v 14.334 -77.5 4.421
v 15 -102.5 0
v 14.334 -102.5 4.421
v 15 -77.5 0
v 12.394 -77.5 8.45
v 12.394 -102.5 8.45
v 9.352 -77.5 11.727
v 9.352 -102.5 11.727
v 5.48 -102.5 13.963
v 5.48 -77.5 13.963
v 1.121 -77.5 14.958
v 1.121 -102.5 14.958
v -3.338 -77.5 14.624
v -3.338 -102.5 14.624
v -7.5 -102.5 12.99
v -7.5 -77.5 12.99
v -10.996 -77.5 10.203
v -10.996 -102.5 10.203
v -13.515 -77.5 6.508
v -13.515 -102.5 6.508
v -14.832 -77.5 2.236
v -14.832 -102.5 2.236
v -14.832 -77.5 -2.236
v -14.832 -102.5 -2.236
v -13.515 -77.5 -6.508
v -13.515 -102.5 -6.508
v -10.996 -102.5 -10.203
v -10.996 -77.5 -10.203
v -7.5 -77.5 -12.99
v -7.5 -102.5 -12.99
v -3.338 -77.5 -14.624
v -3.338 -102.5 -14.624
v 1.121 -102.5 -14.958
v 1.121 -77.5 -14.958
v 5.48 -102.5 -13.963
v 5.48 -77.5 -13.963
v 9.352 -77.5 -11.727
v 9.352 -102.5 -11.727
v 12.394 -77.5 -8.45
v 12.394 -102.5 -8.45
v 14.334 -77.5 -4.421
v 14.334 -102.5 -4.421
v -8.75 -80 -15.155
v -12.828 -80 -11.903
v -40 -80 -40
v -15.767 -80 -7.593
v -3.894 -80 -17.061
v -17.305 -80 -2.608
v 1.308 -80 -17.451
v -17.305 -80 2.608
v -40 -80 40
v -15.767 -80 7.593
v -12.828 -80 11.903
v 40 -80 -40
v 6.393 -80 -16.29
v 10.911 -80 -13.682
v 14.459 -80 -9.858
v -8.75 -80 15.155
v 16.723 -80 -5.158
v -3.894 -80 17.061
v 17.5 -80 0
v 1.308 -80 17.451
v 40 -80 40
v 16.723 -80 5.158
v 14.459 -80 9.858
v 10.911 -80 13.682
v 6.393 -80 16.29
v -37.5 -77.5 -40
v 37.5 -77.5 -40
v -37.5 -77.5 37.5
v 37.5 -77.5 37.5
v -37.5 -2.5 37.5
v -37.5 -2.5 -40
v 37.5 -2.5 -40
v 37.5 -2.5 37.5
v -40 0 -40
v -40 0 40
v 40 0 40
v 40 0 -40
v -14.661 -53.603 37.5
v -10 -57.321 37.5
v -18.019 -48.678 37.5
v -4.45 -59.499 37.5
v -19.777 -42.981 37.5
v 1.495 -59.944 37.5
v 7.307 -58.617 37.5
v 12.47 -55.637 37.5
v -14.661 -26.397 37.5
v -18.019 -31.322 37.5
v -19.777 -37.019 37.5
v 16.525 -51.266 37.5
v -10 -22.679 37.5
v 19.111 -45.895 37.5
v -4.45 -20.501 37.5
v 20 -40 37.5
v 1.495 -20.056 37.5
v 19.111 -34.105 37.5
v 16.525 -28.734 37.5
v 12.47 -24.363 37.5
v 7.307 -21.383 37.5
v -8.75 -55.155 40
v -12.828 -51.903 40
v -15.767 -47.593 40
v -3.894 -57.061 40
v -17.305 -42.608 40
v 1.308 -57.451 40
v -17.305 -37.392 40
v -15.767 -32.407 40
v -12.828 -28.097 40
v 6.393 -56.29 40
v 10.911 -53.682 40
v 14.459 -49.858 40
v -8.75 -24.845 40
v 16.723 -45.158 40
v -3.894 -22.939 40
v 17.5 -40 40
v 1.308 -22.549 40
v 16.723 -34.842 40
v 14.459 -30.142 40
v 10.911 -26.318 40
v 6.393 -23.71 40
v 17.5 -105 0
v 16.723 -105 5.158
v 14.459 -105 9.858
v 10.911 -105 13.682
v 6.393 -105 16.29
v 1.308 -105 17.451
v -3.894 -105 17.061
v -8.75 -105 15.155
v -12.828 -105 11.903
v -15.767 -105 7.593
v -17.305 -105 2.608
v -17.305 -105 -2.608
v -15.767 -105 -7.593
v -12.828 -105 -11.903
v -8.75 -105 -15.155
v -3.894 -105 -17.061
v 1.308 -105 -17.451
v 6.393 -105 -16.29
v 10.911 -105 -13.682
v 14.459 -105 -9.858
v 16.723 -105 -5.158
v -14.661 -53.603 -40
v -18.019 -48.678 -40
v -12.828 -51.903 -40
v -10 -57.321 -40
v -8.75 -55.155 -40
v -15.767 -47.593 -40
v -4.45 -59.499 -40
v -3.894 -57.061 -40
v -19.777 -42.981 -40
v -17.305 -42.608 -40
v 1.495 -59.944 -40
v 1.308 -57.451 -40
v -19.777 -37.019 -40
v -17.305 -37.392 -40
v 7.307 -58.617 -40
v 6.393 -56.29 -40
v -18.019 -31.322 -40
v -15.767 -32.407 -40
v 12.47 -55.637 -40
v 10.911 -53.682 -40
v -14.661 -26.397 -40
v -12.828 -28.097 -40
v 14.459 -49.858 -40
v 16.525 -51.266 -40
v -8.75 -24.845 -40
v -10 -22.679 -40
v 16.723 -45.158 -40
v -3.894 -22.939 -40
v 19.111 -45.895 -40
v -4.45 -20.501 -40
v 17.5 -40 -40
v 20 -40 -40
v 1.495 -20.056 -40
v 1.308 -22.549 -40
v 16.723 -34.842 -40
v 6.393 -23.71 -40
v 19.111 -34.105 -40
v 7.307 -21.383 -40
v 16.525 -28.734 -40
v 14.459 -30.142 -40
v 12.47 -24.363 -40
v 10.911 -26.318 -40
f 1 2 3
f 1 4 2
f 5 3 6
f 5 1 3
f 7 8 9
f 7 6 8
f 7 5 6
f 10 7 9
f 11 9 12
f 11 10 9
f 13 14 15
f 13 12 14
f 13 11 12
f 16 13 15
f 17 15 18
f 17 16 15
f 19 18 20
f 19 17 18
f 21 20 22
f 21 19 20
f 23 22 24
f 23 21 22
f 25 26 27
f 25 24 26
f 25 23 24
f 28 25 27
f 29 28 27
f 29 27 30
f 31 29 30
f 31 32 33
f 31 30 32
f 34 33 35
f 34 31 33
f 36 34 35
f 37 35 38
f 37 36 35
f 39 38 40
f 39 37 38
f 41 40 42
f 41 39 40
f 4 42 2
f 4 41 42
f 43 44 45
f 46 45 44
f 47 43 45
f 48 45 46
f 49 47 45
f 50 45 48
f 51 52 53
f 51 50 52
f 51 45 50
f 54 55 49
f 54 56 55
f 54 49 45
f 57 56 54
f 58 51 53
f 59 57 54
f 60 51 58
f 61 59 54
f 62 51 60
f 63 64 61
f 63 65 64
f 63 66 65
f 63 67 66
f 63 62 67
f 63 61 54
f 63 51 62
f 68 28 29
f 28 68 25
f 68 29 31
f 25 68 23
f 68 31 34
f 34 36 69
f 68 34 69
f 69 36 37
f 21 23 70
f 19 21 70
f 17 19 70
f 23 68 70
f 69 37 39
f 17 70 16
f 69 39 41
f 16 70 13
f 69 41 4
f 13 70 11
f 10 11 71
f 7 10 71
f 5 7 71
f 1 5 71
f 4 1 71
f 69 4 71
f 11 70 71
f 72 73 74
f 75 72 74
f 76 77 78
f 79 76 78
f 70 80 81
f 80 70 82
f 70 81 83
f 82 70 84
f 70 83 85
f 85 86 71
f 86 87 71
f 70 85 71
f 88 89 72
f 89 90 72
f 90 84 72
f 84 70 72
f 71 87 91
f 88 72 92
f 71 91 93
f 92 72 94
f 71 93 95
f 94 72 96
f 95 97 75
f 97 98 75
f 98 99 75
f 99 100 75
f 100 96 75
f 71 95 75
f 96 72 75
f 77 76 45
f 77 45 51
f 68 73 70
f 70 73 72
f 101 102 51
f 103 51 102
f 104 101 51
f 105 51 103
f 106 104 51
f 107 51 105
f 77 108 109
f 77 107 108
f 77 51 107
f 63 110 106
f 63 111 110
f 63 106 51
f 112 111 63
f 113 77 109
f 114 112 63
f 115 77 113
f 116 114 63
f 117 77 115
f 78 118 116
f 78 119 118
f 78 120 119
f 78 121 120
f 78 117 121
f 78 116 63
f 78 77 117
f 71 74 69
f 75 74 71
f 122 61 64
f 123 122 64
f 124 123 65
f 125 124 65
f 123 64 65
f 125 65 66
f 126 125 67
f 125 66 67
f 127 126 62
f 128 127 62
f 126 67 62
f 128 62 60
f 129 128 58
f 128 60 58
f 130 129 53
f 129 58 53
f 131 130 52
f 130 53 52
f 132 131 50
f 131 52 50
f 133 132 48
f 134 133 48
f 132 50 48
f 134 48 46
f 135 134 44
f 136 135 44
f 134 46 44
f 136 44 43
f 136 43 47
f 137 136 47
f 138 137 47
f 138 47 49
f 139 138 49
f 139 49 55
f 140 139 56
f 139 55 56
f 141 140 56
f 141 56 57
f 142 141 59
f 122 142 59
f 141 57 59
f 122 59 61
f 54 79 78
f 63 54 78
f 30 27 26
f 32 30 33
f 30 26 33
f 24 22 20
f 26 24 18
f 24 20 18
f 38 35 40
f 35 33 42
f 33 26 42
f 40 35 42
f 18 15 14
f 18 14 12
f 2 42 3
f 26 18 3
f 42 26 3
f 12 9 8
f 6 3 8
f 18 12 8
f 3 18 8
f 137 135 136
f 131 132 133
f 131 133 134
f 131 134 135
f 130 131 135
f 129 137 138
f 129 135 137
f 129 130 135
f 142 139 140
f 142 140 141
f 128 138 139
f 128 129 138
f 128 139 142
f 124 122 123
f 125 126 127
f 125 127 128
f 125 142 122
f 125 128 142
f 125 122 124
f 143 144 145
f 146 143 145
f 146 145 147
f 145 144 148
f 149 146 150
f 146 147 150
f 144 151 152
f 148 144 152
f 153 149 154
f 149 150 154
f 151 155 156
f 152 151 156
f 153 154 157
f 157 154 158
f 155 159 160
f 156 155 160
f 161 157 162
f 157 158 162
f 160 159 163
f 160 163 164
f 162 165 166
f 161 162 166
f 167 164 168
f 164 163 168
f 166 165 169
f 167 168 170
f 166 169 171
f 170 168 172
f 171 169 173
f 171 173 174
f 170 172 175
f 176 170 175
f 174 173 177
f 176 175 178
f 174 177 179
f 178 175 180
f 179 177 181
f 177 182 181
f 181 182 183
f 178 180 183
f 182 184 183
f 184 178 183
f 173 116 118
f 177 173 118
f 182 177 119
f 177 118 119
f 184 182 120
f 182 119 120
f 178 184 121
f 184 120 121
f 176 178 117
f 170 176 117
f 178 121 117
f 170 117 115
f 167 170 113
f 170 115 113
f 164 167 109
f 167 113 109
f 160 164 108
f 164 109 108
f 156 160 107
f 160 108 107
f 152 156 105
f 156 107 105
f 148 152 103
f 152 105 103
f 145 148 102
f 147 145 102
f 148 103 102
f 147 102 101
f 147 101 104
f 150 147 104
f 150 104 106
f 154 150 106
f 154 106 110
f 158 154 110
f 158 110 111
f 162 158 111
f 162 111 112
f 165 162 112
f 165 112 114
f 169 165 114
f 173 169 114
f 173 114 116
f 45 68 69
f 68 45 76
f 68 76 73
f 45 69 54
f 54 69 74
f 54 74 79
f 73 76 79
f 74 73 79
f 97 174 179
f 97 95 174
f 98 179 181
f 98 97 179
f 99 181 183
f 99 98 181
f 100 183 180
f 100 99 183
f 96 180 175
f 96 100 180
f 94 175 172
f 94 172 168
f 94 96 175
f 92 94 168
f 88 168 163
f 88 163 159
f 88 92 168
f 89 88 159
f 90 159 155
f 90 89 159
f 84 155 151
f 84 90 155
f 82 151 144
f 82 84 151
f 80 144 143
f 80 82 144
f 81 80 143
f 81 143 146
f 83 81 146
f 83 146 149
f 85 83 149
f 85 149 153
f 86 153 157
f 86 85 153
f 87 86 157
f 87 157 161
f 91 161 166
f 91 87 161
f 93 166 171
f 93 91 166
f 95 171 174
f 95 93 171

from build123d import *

# Parameters (mm, degrees)
F0_W     = 80
F0_H     = 80
F1_DEPTH = 80
F2_R     = 17.5
F3_DEPTH = 25
F4_R     = 17.5
F5_DEPTH = 80.001
F6_T     = -2.5


with BuildPart() as f1:
    # F0 (on Front) → F1 (new body)
    with BuildSketch(Plane.XZ):
        Rectangle(F0_W, F0_H)
    extrude(amount=F1_DEPTH)

    # F2 (on face) → F3 (join)
    with BuildSketch(Plane.XZ.offset(80)):
        Circle(F2_R)
    extrude(amount=F3_DEPTH)

    # F4 (on face) → F5 (cut, through all)
    with BuildSketch(Plane.XY.offset(40)):
        with Locations((0, -40)):
            Circle(F4_R)
    extrude(amount=-F5_DEPTH, mode=Mode.SUBTRACT)

    # F6
    f6_openings = [f1.faces().sort_by_distance(p)[0] for p in [
        (-38.868629, -40, -40),
    ]]
    offset(amount=F6_T, openings=f6_openings, kind=Kind.INTERSECTION)


solid = f1.part
